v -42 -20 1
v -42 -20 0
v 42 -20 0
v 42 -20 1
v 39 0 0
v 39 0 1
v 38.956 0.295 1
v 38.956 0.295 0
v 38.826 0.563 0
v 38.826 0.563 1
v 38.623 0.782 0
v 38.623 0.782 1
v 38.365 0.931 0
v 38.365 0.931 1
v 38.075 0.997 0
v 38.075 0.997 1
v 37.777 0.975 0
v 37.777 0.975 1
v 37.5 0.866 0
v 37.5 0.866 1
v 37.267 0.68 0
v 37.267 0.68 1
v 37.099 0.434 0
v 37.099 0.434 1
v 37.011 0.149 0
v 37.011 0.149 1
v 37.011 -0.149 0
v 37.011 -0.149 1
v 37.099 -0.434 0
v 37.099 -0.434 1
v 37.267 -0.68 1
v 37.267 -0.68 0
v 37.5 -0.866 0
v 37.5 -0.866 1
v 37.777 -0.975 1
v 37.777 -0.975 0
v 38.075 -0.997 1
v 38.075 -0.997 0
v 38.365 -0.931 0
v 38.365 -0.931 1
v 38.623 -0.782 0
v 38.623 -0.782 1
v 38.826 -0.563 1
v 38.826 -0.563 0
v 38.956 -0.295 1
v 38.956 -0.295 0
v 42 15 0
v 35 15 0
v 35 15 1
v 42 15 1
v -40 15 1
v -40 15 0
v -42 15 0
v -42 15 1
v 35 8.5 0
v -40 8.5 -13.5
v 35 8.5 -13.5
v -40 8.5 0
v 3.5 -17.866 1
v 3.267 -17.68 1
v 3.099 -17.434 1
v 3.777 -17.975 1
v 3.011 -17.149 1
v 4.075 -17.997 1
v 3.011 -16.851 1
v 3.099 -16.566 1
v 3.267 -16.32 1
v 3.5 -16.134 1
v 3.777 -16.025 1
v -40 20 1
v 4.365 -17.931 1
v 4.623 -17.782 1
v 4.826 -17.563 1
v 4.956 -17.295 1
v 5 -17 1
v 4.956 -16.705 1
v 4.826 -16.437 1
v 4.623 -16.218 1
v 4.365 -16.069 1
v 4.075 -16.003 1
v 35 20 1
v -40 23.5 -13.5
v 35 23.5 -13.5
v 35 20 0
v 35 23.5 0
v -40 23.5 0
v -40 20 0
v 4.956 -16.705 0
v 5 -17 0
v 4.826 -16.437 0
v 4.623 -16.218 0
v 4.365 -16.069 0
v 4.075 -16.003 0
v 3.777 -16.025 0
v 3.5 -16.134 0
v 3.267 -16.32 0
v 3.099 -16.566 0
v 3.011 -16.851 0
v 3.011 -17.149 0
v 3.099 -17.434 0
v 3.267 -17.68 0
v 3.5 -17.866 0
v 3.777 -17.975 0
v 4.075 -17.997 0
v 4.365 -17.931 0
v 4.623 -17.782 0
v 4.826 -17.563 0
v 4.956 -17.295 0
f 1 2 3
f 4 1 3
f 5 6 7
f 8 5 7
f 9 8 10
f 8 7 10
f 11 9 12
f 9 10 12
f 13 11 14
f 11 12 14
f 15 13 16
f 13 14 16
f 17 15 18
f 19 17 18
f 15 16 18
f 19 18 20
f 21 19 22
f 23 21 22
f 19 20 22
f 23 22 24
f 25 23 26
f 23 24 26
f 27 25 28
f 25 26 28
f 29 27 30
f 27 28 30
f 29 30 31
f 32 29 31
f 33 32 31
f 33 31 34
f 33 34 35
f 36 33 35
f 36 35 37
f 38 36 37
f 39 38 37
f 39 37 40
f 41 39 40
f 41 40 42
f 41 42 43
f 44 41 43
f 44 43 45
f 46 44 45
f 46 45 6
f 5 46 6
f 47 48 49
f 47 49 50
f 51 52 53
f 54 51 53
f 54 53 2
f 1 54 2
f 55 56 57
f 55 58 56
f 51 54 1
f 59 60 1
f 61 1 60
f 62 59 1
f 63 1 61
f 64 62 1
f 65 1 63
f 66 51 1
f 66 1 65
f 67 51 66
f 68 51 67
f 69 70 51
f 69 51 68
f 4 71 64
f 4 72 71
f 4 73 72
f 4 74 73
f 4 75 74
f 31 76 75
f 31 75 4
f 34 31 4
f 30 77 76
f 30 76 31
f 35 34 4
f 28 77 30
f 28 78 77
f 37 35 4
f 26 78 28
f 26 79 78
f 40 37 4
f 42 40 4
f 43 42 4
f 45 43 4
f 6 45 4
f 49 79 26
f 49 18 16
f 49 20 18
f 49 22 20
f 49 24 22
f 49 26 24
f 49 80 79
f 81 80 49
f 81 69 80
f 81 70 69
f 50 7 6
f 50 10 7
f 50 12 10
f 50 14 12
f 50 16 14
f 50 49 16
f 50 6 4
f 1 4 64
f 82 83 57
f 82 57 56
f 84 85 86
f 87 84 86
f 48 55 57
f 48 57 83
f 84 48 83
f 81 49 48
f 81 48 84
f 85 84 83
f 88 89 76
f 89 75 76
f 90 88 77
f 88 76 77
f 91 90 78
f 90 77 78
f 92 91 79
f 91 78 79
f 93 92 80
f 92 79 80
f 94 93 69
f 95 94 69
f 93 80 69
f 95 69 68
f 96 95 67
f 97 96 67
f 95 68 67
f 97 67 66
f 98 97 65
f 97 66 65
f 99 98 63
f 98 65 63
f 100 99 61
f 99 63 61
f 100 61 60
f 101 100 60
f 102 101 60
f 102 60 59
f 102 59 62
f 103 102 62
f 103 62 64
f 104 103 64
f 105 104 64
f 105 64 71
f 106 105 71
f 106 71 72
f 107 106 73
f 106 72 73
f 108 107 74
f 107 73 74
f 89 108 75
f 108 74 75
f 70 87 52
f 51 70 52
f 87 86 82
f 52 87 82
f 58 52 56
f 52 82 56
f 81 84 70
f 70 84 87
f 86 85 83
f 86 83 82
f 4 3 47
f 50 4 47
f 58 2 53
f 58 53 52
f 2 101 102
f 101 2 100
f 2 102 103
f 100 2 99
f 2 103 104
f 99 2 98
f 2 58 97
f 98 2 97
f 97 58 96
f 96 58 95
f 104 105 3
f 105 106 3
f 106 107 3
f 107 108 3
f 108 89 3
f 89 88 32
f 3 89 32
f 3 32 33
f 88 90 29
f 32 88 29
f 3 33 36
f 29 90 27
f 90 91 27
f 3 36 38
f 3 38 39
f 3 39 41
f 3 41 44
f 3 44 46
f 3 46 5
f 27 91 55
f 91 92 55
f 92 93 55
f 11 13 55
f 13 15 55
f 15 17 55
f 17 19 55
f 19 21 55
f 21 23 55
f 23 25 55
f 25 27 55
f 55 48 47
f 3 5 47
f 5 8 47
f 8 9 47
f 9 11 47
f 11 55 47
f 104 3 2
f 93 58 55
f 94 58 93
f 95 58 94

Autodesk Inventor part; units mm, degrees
ref_plane "YZ Plane" through (0, 0, 0) normal (1, 0, 0) x (0, 1, 0)
ref_plane "XZ Plane" through (0, 0, 0) normal (0, 1, 0) x (-1, 0, 0)
ref_plane "XY Plane" through (0, 0, 0) normal (0, 0, 1) x (1, 0, 0)
sketch "Эскиз1" plane through (0, 0, 0) normal (0, 0, 1) x (1, 0, 0)
  line L0 (-42, -20) -> (42, -20)
  line L1 (42, -20) -> (42, 20)
  line L2 (42, 20) -> (-42, 20)
  line L3 (-42, 20) -> (-42, -20)
  line L4 (-42, -20) -> (42, 20) construction
  line L5 (42, -20) -> (-42, 20) construction
  line L6 (-42, 20) -> (-40, 20)
  line L7 (-40, 20) -> (-40, 15)
  line L8 (-40, 15) -> (-42, 15)
  line L9 (-42, 15) -> (-42, 20)
  line L10 (42, 20) -> (35, 20)
  line L11 (35, 20) -> (35, 15)
  line L12 (35, 15) -> (42, 15)
  line L13 (42, 15) -> (42, 20)
  point P0 (0, 0)
  dimension "d0" = 84
  dimension "d1" = 40
  dimension "d3" = 5
  dimension "d4" = 2
  dimension "d20" = 75
extrude "Выдавливание1" add sketch "Эскиз1" along normal blind 1 contours L3 L8 L7 L2 L11 L12 L1 L0
sketch "Эскиз2" plane through (0, 0, 0) normal (0, 0, -1) x (-1, 0, 0)
  line L0 (40, 8.5) -> (-35, 8.5)
  line L1 (-35, 8.5) -> (-35, 23.5)
  line L2 (-35, 23.5) -> (40, 23.5)
  line L3 (40, 23.5) -> (40, 8.5)
  line L4 (-35, 20) -> (40, 20) projected
  point P0 (0, 0)
  point P1 (40, 15)
  point P2 (-35, 15)
  dimension "d7" = 3.5
  dimension "d8" = 15
extrude "Выдавливание2" add sketch "Эскиз2" along normal blind 13.5
sketch "Эскиз3" plane through (0, 0, 1) normal (0, 0, 1) x (1, 0, 0)
  circle A0 centre (4, -17) radius 1
  line L0 (-42, -20) -> (42, -20) projected
  line L1 (-42, 15) -> (-42, -20) projected
  circle A1 centre (38, 0) radius 1
  line L2 (42, 15) -> (35, 15) projected
  line L3 (42, -20) -> (42, 15) projected
  point P0 (0, 0)
  dimension "d11" = 2
  dimension "d12" = 3
  dimension "d13" = 46
  dimension "d14" = 2
  dimension "d15" = 15
  dimension "d16" = 4
extrude "Выдавливание3" cut sketch "Эскиз3" against normal through all
sketch "Эскиз4" plane through (0, 0, 1) normal (0, 0, 1) x (1, 0, 0)
  circle A0 centre (38, 0) radius 1 projected
  circle A1 centre (4, -17) radius 1 projected
  line L0 (42, -20) -> (42, 15) projected
  line L1 (42, 15) -> (35, 15) projected
  line L2 (35, 15) -> (35, 20) projected
  line L3 (35, 20) -> (-40, 20) projected
  line L4 (-40, 20) -> (-40, 15) projected
  line L5 (-40, 15) -> (-42, 15) projected
  line L6 (-42, 15) -> (-42, -20) projected
  line L7 (-42, -20) -> (42, -20) projected
  line L8 (42, 15) -> (35, 15) projected
  line L9 (-40, 15) -> (35, 15)
  point P0 (0, 0)
properties part number "TL-SF1005D_pcb"
